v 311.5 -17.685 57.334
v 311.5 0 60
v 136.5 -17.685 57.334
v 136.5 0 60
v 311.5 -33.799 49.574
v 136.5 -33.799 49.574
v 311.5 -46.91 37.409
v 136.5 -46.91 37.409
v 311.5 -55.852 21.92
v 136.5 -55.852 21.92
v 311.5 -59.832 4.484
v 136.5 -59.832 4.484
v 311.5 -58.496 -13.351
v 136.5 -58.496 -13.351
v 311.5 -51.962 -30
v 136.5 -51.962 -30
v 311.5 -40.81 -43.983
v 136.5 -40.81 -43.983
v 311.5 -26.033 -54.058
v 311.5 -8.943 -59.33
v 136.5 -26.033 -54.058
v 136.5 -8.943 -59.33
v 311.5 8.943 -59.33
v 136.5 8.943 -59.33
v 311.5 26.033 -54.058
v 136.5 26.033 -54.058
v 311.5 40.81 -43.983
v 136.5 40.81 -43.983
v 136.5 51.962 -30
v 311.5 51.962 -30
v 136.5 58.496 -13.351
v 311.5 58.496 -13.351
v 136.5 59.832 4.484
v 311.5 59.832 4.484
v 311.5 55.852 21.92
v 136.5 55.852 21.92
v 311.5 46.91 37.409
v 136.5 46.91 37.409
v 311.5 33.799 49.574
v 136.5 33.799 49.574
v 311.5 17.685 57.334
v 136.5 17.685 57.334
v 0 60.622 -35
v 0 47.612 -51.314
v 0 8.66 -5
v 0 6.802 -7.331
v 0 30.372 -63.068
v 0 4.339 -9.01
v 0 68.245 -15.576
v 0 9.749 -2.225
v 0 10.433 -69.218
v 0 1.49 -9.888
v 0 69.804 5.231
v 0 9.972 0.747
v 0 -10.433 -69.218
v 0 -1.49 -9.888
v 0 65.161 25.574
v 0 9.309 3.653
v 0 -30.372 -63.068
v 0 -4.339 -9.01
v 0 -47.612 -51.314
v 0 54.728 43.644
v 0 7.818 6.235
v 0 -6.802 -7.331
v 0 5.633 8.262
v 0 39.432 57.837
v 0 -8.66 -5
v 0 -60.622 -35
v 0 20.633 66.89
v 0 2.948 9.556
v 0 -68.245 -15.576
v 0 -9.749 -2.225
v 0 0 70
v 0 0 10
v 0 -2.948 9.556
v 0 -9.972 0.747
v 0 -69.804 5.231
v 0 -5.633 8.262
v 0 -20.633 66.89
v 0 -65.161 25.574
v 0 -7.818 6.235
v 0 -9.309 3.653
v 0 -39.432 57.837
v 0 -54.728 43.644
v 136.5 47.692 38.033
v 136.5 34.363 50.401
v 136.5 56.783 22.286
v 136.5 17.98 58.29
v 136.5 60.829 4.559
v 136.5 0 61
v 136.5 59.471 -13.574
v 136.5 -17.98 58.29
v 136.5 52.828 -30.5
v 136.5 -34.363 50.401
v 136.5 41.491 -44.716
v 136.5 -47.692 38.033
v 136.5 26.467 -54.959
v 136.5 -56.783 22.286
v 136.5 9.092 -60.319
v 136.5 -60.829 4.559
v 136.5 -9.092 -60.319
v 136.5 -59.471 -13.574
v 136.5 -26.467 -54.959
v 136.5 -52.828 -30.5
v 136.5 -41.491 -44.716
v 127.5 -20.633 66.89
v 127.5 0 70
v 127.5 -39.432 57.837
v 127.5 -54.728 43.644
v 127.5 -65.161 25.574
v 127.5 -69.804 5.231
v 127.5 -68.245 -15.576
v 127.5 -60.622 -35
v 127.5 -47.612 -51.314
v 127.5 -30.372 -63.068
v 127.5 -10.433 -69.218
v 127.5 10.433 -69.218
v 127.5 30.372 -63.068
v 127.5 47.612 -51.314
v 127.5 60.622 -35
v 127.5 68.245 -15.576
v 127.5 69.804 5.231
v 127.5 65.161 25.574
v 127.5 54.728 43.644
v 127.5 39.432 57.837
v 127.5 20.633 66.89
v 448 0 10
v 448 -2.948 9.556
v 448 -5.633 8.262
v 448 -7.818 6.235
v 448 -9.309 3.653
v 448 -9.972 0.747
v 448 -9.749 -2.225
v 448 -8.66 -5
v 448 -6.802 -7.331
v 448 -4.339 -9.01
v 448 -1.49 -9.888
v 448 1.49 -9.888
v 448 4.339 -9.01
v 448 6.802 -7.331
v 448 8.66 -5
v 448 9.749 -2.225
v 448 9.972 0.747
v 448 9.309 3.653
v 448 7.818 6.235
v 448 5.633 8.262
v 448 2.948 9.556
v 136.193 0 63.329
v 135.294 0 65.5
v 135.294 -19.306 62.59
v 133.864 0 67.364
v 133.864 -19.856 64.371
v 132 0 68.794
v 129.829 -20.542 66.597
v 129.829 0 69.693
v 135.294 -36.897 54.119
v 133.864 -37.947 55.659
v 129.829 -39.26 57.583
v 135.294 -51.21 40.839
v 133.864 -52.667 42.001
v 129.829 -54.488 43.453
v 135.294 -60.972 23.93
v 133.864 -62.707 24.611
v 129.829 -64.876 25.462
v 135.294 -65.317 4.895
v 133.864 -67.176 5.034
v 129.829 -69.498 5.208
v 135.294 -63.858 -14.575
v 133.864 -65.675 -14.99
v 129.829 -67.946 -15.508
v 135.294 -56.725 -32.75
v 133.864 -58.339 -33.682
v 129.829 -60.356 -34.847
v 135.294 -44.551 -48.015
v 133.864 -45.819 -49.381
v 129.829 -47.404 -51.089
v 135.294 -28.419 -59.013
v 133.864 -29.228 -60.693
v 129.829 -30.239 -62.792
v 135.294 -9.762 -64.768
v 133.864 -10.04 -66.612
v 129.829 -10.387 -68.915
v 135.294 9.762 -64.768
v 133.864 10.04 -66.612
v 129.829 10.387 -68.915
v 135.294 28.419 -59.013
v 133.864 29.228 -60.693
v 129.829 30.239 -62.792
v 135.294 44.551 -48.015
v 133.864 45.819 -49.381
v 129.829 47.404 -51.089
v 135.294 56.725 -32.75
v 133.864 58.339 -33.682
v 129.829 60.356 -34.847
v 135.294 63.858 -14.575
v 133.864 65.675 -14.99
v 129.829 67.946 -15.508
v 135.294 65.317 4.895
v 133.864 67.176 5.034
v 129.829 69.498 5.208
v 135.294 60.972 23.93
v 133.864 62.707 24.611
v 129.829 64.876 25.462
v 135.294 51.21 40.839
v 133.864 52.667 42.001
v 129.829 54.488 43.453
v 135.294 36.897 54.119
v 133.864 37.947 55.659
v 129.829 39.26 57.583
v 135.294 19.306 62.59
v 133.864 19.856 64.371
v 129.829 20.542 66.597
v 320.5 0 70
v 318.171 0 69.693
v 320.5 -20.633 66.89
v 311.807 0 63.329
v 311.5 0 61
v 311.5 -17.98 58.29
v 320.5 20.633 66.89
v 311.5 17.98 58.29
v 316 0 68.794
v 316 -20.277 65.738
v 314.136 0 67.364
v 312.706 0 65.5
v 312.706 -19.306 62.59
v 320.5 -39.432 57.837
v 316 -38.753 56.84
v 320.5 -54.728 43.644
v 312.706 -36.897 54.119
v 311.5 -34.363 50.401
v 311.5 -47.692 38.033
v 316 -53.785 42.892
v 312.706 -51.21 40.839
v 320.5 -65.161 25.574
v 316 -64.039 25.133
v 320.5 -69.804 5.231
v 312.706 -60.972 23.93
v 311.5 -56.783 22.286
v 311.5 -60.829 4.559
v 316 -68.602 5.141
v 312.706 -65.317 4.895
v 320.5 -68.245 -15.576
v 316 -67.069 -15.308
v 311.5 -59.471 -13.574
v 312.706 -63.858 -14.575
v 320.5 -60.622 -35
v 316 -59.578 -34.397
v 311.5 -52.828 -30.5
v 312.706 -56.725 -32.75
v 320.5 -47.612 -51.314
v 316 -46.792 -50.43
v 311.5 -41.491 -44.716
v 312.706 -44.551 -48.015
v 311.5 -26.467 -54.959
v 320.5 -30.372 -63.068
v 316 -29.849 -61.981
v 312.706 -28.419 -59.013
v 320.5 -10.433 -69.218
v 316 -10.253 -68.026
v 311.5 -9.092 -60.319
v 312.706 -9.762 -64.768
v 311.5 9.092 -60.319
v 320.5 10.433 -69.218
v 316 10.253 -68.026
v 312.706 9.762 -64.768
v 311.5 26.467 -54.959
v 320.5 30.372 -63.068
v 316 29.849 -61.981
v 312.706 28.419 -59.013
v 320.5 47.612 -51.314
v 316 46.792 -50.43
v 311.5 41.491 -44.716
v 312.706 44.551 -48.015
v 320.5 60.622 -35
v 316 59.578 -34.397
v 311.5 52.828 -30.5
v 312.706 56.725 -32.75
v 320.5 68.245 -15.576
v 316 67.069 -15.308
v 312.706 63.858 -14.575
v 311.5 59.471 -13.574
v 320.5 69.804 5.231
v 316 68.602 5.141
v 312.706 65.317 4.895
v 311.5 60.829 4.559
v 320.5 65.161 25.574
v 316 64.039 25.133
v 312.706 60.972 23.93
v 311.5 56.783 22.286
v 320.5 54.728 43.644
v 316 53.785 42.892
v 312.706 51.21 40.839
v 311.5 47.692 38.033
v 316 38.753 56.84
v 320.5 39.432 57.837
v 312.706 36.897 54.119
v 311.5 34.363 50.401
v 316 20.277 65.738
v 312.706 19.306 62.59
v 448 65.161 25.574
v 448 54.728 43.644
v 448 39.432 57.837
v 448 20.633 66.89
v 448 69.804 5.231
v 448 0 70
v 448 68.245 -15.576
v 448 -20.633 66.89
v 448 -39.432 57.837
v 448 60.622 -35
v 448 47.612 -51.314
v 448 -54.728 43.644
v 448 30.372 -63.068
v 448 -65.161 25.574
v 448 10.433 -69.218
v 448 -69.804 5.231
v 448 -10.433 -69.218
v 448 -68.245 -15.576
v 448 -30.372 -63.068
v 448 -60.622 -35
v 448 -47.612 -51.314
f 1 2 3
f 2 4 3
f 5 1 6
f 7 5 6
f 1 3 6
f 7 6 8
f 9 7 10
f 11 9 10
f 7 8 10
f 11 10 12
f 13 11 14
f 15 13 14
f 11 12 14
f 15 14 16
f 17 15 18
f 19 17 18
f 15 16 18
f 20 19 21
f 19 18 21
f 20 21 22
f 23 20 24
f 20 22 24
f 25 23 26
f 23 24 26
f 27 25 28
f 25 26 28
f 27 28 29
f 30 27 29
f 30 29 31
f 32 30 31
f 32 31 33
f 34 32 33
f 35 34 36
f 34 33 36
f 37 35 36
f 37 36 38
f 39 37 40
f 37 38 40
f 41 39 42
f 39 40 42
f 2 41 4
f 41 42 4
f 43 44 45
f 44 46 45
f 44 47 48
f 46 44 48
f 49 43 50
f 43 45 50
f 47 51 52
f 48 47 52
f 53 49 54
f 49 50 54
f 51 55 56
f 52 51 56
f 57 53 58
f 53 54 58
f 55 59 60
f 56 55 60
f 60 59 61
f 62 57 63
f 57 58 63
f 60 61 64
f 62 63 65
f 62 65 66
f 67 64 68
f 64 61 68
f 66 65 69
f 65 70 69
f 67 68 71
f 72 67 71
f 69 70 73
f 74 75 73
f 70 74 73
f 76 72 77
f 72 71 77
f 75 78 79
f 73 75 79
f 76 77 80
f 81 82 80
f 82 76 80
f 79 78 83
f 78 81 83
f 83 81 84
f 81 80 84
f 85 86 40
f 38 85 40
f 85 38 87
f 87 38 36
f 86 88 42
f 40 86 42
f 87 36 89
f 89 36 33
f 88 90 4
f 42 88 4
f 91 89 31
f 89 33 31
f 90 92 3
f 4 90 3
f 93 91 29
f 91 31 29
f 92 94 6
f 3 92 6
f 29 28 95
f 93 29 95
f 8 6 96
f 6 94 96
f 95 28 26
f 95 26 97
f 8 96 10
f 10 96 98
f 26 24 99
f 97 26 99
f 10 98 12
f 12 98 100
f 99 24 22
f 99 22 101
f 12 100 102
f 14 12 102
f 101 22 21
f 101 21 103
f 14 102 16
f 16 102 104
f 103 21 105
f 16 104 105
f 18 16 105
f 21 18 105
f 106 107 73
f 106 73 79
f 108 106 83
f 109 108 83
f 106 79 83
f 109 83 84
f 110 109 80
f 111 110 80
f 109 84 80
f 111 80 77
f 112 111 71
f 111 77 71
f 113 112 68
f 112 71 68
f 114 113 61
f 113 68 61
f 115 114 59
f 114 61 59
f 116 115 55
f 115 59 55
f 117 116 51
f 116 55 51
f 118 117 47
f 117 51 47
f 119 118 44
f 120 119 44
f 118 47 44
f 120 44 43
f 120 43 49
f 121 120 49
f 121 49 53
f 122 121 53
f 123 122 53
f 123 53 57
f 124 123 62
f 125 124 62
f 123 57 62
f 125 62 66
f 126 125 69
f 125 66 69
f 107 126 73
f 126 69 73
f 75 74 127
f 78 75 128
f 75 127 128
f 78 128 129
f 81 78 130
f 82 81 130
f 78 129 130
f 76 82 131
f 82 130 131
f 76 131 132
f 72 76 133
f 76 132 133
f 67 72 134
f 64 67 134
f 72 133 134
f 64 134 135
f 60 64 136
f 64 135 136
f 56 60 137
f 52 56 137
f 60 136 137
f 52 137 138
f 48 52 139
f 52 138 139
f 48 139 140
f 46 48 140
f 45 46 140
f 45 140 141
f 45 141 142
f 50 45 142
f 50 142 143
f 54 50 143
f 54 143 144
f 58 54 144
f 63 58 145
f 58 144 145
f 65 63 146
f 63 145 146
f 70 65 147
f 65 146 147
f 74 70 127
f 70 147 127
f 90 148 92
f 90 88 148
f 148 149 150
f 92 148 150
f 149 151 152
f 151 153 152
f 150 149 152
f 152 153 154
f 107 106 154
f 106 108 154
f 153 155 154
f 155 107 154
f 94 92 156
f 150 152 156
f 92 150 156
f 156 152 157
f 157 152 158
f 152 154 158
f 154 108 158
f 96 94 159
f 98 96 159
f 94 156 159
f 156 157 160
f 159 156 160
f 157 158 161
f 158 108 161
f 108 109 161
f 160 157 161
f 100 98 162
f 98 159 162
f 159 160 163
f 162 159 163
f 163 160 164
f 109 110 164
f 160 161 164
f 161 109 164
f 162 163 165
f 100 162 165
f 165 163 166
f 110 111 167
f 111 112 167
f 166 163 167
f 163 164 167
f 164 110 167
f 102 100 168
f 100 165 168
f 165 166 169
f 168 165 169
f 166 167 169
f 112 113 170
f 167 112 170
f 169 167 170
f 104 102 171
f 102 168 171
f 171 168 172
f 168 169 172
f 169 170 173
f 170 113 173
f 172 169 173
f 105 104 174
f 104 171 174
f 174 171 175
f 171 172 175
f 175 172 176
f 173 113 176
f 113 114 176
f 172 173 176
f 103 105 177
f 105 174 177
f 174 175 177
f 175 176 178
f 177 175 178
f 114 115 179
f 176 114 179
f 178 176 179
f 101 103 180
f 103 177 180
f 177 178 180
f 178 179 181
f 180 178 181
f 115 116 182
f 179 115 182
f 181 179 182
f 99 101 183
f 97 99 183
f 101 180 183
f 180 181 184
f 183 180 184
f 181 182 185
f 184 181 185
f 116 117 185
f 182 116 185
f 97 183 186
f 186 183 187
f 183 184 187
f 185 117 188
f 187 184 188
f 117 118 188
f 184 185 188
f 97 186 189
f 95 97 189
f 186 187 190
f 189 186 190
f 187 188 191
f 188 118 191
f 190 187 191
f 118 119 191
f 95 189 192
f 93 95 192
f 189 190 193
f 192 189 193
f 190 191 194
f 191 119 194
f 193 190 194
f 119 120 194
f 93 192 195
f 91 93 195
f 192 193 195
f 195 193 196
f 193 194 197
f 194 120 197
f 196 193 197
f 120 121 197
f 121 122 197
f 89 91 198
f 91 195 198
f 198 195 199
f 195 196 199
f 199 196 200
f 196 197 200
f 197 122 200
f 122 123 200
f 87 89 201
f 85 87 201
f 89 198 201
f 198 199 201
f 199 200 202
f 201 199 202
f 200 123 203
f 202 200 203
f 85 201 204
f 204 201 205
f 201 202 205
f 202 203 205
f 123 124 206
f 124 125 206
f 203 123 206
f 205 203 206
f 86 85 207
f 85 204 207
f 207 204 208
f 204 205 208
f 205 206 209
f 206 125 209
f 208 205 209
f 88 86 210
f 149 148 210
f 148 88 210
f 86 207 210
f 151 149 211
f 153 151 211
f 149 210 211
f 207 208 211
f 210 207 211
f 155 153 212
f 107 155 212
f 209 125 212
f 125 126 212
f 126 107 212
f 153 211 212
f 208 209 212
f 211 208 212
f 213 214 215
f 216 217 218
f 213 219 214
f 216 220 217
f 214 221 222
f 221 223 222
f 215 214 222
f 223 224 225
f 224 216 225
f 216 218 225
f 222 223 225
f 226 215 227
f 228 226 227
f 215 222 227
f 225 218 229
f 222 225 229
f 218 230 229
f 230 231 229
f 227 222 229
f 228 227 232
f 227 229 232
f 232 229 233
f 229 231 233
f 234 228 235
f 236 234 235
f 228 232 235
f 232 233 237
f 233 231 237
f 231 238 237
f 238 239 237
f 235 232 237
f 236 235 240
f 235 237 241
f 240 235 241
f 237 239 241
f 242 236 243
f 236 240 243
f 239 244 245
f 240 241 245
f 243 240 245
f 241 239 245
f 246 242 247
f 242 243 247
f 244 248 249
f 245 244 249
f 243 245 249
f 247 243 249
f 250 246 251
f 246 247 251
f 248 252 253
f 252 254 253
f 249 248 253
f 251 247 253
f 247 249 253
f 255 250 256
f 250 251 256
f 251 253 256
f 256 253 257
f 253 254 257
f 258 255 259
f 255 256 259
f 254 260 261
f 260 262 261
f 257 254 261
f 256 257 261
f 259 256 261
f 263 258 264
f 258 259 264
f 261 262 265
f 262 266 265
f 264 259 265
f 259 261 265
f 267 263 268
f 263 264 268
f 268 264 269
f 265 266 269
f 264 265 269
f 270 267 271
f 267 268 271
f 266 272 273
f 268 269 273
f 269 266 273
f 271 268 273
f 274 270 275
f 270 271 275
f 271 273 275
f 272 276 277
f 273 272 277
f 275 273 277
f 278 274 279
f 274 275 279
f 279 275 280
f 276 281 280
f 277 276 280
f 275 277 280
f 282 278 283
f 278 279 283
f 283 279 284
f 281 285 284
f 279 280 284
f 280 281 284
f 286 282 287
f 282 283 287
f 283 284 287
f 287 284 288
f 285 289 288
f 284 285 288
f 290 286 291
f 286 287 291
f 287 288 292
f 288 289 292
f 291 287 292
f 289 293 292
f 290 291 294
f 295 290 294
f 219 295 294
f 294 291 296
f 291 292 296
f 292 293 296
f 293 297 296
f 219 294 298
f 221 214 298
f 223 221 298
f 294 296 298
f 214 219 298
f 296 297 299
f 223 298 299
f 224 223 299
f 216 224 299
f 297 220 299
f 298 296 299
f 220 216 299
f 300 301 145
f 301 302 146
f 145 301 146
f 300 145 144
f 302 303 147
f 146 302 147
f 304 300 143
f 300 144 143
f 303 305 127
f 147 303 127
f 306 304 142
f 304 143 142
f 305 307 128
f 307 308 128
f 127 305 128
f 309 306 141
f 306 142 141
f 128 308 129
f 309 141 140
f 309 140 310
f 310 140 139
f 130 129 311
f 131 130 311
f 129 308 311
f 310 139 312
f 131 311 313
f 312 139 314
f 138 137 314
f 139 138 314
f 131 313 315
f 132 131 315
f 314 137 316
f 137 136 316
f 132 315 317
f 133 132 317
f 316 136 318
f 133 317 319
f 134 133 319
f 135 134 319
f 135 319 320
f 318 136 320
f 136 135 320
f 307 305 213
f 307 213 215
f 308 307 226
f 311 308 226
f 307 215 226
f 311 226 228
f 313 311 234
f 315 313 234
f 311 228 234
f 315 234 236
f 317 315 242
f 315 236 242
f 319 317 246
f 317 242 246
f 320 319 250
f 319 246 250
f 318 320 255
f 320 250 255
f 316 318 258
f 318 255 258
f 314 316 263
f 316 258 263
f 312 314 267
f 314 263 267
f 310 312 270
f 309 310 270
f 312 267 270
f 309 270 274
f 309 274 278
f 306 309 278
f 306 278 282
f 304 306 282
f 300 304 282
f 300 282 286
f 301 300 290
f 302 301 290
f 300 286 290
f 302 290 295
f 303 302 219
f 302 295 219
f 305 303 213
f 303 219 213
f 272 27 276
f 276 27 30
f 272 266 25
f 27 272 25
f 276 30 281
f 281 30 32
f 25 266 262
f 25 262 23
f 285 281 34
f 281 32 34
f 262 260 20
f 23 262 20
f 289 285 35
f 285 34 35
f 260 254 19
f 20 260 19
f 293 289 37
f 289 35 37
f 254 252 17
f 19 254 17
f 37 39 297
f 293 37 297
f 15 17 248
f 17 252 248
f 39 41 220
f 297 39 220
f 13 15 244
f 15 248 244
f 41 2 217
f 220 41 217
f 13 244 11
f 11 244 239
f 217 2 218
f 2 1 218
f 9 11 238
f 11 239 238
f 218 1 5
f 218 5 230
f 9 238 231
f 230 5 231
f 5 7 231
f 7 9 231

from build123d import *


with BuildPart() as part:
    # Esquisse1 → Révolution1 (revolve)
    with BuildSketch(Plane.XY, mode=Mode.PRIVATE) as r_volution1_sk:
        with BuildLine():
            Line((0, 70), (0, 10))
            Line((0, 10), (448, 10))
            Line((448, 10), (448, 70))
            Line((448, 70), (320.5, 70))
            ThreePointArc((320.5, 70), (314.136038969, 67.363961031), (311.5, 61))
            Line((311.5, 61), (311.5, 60))
            Line((311.5, 60), (136.5, 60))
            Line((136.5, 60), (136.5, 61))
            ThreePointArc((136.5, 61), (133.863961031, 67.363961031), (127.5, 70))
            Line((127.5, 70), (0, 70))
        make_face()
    revolve(r_volution1_sk.sketch.rotate(Axis((0, 0, 0), (1, 0, 0)), 90), axis=Axis((0, 0, 0), (1, 0, 0)))


solid = part.part
